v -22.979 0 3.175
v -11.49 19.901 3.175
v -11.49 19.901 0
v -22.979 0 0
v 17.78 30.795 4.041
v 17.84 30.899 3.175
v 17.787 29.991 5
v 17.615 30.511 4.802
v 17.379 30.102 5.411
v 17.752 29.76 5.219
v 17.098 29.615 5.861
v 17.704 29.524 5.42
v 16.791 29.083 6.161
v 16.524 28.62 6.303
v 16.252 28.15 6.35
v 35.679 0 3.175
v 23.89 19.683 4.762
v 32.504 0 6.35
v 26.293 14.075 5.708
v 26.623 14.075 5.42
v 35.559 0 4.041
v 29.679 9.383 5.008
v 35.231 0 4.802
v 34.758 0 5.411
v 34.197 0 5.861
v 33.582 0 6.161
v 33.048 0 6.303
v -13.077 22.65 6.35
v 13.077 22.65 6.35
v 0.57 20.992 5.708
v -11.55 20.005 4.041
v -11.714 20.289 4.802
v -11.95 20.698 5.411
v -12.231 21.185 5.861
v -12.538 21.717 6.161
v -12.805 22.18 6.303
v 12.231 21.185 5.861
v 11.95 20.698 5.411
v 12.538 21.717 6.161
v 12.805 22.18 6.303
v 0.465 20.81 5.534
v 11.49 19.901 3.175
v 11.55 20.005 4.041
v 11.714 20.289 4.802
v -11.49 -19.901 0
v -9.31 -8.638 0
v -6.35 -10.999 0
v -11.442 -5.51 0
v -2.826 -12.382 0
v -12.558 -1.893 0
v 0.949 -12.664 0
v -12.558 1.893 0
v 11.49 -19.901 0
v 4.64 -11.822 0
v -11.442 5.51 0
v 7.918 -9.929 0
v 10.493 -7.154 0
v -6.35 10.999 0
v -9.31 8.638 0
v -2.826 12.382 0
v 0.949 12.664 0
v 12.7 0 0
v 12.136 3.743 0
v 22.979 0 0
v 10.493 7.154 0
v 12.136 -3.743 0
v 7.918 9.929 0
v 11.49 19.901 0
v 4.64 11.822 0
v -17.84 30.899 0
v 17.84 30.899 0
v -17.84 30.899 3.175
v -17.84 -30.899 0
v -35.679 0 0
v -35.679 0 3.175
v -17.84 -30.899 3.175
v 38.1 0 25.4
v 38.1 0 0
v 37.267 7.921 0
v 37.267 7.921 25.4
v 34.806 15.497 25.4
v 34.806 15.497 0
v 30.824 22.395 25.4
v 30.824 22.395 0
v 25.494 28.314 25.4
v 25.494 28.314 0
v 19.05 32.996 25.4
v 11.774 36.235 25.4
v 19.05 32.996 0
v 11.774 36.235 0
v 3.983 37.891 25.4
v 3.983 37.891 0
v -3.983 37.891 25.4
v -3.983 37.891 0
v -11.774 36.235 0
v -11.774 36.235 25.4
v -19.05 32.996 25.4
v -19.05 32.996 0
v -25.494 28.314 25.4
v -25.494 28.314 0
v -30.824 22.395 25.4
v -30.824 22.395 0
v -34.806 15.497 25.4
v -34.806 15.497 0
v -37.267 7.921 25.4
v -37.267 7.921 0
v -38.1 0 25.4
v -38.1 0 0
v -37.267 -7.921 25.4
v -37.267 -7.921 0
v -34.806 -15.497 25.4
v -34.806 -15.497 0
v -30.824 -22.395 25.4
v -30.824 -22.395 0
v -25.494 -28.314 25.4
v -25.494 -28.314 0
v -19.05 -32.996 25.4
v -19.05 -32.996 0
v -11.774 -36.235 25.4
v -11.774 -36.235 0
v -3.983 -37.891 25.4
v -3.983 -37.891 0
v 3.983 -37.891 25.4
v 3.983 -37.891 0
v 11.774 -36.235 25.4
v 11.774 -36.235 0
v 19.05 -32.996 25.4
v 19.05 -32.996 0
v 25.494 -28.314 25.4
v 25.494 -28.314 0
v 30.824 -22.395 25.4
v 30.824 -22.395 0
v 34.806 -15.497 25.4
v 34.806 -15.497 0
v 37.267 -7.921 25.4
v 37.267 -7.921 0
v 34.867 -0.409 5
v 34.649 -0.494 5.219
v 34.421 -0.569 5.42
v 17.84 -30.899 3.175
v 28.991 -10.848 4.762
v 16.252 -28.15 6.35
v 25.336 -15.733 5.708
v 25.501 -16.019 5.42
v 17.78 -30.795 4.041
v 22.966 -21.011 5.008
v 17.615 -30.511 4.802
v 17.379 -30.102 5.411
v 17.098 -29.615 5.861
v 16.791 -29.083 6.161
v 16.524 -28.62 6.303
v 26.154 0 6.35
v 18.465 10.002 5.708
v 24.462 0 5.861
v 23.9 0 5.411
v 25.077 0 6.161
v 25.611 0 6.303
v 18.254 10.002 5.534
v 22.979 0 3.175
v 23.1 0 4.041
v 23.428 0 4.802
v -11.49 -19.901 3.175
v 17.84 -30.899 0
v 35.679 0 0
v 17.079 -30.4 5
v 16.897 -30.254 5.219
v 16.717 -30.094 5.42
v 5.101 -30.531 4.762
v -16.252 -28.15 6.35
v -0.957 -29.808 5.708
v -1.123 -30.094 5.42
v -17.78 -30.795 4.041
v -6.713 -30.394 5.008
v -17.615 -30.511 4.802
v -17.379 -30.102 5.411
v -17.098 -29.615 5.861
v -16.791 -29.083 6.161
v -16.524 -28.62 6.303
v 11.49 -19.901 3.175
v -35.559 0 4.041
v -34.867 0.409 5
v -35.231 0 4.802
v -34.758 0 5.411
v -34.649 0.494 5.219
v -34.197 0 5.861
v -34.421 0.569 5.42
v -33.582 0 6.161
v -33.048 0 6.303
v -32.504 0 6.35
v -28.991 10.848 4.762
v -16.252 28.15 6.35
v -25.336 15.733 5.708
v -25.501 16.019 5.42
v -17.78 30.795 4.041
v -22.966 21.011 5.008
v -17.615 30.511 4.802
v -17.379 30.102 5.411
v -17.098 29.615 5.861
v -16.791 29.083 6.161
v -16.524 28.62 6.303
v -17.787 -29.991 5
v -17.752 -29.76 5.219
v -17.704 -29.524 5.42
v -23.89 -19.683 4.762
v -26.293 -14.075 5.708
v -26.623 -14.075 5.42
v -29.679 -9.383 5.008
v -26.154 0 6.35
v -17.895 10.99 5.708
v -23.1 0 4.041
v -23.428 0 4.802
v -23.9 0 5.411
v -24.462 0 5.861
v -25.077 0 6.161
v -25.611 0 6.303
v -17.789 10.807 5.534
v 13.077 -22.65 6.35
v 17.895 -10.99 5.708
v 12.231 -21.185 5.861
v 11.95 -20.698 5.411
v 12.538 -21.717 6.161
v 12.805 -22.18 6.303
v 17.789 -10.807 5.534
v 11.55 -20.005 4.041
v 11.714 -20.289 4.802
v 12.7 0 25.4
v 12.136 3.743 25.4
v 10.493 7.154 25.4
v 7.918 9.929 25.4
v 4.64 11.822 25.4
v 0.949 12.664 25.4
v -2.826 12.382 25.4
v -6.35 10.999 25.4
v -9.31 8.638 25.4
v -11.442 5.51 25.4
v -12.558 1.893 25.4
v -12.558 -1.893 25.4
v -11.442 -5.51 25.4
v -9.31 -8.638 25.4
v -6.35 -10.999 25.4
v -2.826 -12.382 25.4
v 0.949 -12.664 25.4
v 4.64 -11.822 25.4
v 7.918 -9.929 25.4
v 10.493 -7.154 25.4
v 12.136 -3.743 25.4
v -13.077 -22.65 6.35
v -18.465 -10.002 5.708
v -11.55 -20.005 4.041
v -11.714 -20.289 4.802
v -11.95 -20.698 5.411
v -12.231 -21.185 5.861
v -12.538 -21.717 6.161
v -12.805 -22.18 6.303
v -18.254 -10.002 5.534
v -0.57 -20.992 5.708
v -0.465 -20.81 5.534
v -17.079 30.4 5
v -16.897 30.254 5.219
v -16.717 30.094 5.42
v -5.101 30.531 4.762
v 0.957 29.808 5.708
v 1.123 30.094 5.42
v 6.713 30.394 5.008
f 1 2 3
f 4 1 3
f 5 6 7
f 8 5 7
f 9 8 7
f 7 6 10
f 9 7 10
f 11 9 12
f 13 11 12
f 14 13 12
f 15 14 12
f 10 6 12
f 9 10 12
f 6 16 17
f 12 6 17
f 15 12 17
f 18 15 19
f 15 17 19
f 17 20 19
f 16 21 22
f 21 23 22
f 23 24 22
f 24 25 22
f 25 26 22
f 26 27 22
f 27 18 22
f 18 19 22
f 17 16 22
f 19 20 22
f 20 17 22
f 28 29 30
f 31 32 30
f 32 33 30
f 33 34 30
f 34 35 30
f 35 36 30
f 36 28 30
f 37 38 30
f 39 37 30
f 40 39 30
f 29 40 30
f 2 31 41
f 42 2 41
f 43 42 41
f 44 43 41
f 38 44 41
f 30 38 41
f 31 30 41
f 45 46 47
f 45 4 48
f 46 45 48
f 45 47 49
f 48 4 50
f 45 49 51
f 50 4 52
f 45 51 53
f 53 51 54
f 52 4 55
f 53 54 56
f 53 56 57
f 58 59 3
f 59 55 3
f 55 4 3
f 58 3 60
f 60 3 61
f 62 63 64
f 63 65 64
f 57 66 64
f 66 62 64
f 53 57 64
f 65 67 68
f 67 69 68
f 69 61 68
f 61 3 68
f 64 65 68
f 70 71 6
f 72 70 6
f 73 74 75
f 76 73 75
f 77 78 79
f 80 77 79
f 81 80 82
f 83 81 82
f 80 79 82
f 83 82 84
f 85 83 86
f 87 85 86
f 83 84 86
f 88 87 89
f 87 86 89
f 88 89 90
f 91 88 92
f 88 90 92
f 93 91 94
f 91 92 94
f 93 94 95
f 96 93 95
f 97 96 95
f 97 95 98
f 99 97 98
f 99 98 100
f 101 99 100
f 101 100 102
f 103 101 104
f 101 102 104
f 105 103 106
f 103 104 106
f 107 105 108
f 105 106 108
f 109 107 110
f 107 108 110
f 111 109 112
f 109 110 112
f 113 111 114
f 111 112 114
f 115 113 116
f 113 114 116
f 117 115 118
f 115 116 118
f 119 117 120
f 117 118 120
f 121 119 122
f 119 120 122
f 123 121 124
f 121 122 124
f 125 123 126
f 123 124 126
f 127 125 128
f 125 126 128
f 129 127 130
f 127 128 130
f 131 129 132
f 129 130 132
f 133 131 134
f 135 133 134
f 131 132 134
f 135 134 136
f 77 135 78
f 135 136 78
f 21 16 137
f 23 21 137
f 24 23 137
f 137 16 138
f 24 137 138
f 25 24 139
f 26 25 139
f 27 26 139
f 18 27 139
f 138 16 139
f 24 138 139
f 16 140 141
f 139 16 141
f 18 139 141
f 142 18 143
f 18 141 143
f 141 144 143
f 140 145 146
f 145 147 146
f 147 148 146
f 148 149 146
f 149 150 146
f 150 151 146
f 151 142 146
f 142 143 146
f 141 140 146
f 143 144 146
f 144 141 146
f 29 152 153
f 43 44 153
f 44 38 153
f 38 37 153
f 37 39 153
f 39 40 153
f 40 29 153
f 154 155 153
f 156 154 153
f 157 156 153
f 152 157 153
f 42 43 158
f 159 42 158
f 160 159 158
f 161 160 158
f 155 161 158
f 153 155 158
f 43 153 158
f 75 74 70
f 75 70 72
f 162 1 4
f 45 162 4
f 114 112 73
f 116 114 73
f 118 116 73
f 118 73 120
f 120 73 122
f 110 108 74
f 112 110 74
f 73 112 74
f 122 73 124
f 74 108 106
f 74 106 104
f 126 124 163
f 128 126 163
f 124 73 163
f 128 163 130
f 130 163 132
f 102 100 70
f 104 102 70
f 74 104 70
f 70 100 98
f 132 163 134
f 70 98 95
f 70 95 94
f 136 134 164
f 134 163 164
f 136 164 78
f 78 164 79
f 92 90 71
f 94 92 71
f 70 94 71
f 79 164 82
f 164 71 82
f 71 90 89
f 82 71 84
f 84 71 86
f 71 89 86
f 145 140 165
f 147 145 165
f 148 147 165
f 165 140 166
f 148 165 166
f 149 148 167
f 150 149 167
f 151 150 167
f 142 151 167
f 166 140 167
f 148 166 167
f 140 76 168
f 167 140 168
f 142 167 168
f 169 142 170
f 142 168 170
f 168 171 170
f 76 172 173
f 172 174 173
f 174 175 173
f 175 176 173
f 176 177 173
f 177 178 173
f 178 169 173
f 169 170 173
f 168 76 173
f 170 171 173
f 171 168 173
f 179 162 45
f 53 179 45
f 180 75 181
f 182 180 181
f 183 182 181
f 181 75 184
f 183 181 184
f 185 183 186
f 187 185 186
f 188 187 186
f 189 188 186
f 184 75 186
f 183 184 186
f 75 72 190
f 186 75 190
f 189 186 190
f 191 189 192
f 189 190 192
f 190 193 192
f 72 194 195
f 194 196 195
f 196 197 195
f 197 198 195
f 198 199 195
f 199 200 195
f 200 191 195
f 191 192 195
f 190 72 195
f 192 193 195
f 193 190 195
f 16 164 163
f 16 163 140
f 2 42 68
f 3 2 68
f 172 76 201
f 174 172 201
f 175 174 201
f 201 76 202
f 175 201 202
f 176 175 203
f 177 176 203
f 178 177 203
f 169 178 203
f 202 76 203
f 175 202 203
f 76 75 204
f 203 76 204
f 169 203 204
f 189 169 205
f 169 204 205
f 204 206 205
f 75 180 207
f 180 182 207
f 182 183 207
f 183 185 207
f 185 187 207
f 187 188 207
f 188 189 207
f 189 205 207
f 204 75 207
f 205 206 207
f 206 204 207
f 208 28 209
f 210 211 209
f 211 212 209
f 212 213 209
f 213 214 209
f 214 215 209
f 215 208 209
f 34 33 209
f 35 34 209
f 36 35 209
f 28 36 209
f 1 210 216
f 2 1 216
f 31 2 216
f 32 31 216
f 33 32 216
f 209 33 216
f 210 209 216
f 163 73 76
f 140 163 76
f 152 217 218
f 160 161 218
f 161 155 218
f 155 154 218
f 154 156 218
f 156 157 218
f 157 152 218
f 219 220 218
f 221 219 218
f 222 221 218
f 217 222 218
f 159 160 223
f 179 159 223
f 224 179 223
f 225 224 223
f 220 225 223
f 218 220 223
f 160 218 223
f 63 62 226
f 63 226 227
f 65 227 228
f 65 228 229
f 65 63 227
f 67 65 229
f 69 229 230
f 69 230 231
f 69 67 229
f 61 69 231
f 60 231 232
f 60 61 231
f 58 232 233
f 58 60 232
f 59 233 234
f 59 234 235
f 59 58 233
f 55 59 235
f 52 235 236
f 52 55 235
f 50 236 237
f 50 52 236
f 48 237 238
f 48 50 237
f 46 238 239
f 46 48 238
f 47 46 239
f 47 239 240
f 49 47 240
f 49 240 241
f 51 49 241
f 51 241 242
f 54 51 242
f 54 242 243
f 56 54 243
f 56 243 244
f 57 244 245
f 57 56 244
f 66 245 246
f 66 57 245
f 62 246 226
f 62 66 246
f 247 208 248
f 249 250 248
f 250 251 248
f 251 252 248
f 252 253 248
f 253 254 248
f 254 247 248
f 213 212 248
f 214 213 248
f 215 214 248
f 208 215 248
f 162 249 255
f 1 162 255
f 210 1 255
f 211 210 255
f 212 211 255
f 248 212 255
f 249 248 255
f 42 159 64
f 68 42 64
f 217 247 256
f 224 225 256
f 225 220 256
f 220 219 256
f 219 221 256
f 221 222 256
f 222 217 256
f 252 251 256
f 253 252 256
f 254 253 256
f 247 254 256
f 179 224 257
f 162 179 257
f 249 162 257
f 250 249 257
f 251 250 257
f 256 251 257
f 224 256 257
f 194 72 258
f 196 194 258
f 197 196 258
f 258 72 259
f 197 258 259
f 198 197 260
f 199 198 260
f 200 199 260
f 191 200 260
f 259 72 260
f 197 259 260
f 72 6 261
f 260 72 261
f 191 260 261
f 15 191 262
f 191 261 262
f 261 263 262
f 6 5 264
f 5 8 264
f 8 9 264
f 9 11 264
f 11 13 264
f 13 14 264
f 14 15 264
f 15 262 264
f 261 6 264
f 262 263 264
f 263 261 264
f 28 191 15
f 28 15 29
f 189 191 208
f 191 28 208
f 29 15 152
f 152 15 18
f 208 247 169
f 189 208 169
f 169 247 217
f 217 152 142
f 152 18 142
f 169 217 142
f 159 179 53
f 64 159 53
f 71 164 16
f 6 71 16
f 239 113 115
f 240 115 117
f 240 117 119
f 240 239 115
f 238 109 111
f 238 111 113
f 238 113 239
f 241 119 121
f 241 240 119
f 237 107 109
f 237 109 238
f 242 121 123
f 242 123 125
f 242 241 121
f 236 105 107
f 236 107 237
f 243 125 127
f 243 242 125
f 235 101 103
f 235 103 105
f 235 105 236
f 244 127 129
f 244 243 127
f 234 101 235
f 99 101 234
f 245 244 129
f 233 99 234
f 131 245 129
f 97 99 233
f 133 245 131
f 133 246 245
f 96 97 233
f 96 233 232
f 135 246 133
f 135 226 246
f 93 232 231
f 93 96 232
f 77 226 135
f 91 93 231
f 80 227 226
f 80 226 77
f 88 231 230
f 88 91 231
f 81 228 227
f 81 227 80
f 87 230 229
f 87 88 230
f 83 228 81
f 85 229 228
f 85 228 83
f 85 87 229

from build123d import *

# Parameters (mm, degrees)
SKETCH1_R           = 38.1
SKETCH1_R_2         = 12.7
BOSS_EXTRUDE1_DEPTH = 25.4


with BuildPart() as part:
    # Sketch1 → Boss-Extrude1 (new body)
    with BuildSketch(Plane.XY):
        Circle(SKETCH1_R)
        Circle(SKETCH1_R_2, mode=Mode.SUBTRACT)
    extrude(amount=BOSS_EXTRUDE1_DEPTH)

    # Cut-Sweep2: sweep along a path in Sketch2
    with BuildLine(Plane(origin=(0, 0, 0), x_dir=(-1, 0, 0), z_dir=(0, 0, -1))) as cut_sweep2_path:
        Line((-14.664696837, 25.4), (-29.329393675, 0))
        Line((-29.329393675, 0), (-14.664696837, -25.4))
        Line((-14.664696837, -25.4), (14.664696837, -25.4))
        Line((14.664696837, -25.4), (29.329393675, 0))
        Line((29.329393675, 0), (14.664696837, 25.4))
        Line((14.664696837, 25.4), (-14.664696837, 25.4))
    # Sketch3 → Cut-Sweep2 (sweep, cut)
    with BuildSketch(Plane(origin=(0, 0, 0), x_dir=(1, 0, 0), z_dir=(0, 1, 0))):
        with BuildLine():
            Line((-35.679393675, 0), (-22.979393675, 0))
            Line((-22.979393675, 0), (-22.979393675, -3.175))
            ThreePointArc((-22.979393675, -3.175), (-23.909329645, -5.42006403), (-26.154393675, -6.35))
            Line((-26.154393675, -6.35), (-32.504393675, -6.35))
            ThreePointArc((-32.504393675, -6.35), (-34.749457705, -5.42006403), (-35.679393675, -3.175))
            Line((-35.679393675, -3.175), (-35.679393675, 0))
        make_face()
    sweep(path=cut_sweep2_path.line, transition=Transition.RIGHT, mode=Mode.SUBTRACT)


solid = part.part
